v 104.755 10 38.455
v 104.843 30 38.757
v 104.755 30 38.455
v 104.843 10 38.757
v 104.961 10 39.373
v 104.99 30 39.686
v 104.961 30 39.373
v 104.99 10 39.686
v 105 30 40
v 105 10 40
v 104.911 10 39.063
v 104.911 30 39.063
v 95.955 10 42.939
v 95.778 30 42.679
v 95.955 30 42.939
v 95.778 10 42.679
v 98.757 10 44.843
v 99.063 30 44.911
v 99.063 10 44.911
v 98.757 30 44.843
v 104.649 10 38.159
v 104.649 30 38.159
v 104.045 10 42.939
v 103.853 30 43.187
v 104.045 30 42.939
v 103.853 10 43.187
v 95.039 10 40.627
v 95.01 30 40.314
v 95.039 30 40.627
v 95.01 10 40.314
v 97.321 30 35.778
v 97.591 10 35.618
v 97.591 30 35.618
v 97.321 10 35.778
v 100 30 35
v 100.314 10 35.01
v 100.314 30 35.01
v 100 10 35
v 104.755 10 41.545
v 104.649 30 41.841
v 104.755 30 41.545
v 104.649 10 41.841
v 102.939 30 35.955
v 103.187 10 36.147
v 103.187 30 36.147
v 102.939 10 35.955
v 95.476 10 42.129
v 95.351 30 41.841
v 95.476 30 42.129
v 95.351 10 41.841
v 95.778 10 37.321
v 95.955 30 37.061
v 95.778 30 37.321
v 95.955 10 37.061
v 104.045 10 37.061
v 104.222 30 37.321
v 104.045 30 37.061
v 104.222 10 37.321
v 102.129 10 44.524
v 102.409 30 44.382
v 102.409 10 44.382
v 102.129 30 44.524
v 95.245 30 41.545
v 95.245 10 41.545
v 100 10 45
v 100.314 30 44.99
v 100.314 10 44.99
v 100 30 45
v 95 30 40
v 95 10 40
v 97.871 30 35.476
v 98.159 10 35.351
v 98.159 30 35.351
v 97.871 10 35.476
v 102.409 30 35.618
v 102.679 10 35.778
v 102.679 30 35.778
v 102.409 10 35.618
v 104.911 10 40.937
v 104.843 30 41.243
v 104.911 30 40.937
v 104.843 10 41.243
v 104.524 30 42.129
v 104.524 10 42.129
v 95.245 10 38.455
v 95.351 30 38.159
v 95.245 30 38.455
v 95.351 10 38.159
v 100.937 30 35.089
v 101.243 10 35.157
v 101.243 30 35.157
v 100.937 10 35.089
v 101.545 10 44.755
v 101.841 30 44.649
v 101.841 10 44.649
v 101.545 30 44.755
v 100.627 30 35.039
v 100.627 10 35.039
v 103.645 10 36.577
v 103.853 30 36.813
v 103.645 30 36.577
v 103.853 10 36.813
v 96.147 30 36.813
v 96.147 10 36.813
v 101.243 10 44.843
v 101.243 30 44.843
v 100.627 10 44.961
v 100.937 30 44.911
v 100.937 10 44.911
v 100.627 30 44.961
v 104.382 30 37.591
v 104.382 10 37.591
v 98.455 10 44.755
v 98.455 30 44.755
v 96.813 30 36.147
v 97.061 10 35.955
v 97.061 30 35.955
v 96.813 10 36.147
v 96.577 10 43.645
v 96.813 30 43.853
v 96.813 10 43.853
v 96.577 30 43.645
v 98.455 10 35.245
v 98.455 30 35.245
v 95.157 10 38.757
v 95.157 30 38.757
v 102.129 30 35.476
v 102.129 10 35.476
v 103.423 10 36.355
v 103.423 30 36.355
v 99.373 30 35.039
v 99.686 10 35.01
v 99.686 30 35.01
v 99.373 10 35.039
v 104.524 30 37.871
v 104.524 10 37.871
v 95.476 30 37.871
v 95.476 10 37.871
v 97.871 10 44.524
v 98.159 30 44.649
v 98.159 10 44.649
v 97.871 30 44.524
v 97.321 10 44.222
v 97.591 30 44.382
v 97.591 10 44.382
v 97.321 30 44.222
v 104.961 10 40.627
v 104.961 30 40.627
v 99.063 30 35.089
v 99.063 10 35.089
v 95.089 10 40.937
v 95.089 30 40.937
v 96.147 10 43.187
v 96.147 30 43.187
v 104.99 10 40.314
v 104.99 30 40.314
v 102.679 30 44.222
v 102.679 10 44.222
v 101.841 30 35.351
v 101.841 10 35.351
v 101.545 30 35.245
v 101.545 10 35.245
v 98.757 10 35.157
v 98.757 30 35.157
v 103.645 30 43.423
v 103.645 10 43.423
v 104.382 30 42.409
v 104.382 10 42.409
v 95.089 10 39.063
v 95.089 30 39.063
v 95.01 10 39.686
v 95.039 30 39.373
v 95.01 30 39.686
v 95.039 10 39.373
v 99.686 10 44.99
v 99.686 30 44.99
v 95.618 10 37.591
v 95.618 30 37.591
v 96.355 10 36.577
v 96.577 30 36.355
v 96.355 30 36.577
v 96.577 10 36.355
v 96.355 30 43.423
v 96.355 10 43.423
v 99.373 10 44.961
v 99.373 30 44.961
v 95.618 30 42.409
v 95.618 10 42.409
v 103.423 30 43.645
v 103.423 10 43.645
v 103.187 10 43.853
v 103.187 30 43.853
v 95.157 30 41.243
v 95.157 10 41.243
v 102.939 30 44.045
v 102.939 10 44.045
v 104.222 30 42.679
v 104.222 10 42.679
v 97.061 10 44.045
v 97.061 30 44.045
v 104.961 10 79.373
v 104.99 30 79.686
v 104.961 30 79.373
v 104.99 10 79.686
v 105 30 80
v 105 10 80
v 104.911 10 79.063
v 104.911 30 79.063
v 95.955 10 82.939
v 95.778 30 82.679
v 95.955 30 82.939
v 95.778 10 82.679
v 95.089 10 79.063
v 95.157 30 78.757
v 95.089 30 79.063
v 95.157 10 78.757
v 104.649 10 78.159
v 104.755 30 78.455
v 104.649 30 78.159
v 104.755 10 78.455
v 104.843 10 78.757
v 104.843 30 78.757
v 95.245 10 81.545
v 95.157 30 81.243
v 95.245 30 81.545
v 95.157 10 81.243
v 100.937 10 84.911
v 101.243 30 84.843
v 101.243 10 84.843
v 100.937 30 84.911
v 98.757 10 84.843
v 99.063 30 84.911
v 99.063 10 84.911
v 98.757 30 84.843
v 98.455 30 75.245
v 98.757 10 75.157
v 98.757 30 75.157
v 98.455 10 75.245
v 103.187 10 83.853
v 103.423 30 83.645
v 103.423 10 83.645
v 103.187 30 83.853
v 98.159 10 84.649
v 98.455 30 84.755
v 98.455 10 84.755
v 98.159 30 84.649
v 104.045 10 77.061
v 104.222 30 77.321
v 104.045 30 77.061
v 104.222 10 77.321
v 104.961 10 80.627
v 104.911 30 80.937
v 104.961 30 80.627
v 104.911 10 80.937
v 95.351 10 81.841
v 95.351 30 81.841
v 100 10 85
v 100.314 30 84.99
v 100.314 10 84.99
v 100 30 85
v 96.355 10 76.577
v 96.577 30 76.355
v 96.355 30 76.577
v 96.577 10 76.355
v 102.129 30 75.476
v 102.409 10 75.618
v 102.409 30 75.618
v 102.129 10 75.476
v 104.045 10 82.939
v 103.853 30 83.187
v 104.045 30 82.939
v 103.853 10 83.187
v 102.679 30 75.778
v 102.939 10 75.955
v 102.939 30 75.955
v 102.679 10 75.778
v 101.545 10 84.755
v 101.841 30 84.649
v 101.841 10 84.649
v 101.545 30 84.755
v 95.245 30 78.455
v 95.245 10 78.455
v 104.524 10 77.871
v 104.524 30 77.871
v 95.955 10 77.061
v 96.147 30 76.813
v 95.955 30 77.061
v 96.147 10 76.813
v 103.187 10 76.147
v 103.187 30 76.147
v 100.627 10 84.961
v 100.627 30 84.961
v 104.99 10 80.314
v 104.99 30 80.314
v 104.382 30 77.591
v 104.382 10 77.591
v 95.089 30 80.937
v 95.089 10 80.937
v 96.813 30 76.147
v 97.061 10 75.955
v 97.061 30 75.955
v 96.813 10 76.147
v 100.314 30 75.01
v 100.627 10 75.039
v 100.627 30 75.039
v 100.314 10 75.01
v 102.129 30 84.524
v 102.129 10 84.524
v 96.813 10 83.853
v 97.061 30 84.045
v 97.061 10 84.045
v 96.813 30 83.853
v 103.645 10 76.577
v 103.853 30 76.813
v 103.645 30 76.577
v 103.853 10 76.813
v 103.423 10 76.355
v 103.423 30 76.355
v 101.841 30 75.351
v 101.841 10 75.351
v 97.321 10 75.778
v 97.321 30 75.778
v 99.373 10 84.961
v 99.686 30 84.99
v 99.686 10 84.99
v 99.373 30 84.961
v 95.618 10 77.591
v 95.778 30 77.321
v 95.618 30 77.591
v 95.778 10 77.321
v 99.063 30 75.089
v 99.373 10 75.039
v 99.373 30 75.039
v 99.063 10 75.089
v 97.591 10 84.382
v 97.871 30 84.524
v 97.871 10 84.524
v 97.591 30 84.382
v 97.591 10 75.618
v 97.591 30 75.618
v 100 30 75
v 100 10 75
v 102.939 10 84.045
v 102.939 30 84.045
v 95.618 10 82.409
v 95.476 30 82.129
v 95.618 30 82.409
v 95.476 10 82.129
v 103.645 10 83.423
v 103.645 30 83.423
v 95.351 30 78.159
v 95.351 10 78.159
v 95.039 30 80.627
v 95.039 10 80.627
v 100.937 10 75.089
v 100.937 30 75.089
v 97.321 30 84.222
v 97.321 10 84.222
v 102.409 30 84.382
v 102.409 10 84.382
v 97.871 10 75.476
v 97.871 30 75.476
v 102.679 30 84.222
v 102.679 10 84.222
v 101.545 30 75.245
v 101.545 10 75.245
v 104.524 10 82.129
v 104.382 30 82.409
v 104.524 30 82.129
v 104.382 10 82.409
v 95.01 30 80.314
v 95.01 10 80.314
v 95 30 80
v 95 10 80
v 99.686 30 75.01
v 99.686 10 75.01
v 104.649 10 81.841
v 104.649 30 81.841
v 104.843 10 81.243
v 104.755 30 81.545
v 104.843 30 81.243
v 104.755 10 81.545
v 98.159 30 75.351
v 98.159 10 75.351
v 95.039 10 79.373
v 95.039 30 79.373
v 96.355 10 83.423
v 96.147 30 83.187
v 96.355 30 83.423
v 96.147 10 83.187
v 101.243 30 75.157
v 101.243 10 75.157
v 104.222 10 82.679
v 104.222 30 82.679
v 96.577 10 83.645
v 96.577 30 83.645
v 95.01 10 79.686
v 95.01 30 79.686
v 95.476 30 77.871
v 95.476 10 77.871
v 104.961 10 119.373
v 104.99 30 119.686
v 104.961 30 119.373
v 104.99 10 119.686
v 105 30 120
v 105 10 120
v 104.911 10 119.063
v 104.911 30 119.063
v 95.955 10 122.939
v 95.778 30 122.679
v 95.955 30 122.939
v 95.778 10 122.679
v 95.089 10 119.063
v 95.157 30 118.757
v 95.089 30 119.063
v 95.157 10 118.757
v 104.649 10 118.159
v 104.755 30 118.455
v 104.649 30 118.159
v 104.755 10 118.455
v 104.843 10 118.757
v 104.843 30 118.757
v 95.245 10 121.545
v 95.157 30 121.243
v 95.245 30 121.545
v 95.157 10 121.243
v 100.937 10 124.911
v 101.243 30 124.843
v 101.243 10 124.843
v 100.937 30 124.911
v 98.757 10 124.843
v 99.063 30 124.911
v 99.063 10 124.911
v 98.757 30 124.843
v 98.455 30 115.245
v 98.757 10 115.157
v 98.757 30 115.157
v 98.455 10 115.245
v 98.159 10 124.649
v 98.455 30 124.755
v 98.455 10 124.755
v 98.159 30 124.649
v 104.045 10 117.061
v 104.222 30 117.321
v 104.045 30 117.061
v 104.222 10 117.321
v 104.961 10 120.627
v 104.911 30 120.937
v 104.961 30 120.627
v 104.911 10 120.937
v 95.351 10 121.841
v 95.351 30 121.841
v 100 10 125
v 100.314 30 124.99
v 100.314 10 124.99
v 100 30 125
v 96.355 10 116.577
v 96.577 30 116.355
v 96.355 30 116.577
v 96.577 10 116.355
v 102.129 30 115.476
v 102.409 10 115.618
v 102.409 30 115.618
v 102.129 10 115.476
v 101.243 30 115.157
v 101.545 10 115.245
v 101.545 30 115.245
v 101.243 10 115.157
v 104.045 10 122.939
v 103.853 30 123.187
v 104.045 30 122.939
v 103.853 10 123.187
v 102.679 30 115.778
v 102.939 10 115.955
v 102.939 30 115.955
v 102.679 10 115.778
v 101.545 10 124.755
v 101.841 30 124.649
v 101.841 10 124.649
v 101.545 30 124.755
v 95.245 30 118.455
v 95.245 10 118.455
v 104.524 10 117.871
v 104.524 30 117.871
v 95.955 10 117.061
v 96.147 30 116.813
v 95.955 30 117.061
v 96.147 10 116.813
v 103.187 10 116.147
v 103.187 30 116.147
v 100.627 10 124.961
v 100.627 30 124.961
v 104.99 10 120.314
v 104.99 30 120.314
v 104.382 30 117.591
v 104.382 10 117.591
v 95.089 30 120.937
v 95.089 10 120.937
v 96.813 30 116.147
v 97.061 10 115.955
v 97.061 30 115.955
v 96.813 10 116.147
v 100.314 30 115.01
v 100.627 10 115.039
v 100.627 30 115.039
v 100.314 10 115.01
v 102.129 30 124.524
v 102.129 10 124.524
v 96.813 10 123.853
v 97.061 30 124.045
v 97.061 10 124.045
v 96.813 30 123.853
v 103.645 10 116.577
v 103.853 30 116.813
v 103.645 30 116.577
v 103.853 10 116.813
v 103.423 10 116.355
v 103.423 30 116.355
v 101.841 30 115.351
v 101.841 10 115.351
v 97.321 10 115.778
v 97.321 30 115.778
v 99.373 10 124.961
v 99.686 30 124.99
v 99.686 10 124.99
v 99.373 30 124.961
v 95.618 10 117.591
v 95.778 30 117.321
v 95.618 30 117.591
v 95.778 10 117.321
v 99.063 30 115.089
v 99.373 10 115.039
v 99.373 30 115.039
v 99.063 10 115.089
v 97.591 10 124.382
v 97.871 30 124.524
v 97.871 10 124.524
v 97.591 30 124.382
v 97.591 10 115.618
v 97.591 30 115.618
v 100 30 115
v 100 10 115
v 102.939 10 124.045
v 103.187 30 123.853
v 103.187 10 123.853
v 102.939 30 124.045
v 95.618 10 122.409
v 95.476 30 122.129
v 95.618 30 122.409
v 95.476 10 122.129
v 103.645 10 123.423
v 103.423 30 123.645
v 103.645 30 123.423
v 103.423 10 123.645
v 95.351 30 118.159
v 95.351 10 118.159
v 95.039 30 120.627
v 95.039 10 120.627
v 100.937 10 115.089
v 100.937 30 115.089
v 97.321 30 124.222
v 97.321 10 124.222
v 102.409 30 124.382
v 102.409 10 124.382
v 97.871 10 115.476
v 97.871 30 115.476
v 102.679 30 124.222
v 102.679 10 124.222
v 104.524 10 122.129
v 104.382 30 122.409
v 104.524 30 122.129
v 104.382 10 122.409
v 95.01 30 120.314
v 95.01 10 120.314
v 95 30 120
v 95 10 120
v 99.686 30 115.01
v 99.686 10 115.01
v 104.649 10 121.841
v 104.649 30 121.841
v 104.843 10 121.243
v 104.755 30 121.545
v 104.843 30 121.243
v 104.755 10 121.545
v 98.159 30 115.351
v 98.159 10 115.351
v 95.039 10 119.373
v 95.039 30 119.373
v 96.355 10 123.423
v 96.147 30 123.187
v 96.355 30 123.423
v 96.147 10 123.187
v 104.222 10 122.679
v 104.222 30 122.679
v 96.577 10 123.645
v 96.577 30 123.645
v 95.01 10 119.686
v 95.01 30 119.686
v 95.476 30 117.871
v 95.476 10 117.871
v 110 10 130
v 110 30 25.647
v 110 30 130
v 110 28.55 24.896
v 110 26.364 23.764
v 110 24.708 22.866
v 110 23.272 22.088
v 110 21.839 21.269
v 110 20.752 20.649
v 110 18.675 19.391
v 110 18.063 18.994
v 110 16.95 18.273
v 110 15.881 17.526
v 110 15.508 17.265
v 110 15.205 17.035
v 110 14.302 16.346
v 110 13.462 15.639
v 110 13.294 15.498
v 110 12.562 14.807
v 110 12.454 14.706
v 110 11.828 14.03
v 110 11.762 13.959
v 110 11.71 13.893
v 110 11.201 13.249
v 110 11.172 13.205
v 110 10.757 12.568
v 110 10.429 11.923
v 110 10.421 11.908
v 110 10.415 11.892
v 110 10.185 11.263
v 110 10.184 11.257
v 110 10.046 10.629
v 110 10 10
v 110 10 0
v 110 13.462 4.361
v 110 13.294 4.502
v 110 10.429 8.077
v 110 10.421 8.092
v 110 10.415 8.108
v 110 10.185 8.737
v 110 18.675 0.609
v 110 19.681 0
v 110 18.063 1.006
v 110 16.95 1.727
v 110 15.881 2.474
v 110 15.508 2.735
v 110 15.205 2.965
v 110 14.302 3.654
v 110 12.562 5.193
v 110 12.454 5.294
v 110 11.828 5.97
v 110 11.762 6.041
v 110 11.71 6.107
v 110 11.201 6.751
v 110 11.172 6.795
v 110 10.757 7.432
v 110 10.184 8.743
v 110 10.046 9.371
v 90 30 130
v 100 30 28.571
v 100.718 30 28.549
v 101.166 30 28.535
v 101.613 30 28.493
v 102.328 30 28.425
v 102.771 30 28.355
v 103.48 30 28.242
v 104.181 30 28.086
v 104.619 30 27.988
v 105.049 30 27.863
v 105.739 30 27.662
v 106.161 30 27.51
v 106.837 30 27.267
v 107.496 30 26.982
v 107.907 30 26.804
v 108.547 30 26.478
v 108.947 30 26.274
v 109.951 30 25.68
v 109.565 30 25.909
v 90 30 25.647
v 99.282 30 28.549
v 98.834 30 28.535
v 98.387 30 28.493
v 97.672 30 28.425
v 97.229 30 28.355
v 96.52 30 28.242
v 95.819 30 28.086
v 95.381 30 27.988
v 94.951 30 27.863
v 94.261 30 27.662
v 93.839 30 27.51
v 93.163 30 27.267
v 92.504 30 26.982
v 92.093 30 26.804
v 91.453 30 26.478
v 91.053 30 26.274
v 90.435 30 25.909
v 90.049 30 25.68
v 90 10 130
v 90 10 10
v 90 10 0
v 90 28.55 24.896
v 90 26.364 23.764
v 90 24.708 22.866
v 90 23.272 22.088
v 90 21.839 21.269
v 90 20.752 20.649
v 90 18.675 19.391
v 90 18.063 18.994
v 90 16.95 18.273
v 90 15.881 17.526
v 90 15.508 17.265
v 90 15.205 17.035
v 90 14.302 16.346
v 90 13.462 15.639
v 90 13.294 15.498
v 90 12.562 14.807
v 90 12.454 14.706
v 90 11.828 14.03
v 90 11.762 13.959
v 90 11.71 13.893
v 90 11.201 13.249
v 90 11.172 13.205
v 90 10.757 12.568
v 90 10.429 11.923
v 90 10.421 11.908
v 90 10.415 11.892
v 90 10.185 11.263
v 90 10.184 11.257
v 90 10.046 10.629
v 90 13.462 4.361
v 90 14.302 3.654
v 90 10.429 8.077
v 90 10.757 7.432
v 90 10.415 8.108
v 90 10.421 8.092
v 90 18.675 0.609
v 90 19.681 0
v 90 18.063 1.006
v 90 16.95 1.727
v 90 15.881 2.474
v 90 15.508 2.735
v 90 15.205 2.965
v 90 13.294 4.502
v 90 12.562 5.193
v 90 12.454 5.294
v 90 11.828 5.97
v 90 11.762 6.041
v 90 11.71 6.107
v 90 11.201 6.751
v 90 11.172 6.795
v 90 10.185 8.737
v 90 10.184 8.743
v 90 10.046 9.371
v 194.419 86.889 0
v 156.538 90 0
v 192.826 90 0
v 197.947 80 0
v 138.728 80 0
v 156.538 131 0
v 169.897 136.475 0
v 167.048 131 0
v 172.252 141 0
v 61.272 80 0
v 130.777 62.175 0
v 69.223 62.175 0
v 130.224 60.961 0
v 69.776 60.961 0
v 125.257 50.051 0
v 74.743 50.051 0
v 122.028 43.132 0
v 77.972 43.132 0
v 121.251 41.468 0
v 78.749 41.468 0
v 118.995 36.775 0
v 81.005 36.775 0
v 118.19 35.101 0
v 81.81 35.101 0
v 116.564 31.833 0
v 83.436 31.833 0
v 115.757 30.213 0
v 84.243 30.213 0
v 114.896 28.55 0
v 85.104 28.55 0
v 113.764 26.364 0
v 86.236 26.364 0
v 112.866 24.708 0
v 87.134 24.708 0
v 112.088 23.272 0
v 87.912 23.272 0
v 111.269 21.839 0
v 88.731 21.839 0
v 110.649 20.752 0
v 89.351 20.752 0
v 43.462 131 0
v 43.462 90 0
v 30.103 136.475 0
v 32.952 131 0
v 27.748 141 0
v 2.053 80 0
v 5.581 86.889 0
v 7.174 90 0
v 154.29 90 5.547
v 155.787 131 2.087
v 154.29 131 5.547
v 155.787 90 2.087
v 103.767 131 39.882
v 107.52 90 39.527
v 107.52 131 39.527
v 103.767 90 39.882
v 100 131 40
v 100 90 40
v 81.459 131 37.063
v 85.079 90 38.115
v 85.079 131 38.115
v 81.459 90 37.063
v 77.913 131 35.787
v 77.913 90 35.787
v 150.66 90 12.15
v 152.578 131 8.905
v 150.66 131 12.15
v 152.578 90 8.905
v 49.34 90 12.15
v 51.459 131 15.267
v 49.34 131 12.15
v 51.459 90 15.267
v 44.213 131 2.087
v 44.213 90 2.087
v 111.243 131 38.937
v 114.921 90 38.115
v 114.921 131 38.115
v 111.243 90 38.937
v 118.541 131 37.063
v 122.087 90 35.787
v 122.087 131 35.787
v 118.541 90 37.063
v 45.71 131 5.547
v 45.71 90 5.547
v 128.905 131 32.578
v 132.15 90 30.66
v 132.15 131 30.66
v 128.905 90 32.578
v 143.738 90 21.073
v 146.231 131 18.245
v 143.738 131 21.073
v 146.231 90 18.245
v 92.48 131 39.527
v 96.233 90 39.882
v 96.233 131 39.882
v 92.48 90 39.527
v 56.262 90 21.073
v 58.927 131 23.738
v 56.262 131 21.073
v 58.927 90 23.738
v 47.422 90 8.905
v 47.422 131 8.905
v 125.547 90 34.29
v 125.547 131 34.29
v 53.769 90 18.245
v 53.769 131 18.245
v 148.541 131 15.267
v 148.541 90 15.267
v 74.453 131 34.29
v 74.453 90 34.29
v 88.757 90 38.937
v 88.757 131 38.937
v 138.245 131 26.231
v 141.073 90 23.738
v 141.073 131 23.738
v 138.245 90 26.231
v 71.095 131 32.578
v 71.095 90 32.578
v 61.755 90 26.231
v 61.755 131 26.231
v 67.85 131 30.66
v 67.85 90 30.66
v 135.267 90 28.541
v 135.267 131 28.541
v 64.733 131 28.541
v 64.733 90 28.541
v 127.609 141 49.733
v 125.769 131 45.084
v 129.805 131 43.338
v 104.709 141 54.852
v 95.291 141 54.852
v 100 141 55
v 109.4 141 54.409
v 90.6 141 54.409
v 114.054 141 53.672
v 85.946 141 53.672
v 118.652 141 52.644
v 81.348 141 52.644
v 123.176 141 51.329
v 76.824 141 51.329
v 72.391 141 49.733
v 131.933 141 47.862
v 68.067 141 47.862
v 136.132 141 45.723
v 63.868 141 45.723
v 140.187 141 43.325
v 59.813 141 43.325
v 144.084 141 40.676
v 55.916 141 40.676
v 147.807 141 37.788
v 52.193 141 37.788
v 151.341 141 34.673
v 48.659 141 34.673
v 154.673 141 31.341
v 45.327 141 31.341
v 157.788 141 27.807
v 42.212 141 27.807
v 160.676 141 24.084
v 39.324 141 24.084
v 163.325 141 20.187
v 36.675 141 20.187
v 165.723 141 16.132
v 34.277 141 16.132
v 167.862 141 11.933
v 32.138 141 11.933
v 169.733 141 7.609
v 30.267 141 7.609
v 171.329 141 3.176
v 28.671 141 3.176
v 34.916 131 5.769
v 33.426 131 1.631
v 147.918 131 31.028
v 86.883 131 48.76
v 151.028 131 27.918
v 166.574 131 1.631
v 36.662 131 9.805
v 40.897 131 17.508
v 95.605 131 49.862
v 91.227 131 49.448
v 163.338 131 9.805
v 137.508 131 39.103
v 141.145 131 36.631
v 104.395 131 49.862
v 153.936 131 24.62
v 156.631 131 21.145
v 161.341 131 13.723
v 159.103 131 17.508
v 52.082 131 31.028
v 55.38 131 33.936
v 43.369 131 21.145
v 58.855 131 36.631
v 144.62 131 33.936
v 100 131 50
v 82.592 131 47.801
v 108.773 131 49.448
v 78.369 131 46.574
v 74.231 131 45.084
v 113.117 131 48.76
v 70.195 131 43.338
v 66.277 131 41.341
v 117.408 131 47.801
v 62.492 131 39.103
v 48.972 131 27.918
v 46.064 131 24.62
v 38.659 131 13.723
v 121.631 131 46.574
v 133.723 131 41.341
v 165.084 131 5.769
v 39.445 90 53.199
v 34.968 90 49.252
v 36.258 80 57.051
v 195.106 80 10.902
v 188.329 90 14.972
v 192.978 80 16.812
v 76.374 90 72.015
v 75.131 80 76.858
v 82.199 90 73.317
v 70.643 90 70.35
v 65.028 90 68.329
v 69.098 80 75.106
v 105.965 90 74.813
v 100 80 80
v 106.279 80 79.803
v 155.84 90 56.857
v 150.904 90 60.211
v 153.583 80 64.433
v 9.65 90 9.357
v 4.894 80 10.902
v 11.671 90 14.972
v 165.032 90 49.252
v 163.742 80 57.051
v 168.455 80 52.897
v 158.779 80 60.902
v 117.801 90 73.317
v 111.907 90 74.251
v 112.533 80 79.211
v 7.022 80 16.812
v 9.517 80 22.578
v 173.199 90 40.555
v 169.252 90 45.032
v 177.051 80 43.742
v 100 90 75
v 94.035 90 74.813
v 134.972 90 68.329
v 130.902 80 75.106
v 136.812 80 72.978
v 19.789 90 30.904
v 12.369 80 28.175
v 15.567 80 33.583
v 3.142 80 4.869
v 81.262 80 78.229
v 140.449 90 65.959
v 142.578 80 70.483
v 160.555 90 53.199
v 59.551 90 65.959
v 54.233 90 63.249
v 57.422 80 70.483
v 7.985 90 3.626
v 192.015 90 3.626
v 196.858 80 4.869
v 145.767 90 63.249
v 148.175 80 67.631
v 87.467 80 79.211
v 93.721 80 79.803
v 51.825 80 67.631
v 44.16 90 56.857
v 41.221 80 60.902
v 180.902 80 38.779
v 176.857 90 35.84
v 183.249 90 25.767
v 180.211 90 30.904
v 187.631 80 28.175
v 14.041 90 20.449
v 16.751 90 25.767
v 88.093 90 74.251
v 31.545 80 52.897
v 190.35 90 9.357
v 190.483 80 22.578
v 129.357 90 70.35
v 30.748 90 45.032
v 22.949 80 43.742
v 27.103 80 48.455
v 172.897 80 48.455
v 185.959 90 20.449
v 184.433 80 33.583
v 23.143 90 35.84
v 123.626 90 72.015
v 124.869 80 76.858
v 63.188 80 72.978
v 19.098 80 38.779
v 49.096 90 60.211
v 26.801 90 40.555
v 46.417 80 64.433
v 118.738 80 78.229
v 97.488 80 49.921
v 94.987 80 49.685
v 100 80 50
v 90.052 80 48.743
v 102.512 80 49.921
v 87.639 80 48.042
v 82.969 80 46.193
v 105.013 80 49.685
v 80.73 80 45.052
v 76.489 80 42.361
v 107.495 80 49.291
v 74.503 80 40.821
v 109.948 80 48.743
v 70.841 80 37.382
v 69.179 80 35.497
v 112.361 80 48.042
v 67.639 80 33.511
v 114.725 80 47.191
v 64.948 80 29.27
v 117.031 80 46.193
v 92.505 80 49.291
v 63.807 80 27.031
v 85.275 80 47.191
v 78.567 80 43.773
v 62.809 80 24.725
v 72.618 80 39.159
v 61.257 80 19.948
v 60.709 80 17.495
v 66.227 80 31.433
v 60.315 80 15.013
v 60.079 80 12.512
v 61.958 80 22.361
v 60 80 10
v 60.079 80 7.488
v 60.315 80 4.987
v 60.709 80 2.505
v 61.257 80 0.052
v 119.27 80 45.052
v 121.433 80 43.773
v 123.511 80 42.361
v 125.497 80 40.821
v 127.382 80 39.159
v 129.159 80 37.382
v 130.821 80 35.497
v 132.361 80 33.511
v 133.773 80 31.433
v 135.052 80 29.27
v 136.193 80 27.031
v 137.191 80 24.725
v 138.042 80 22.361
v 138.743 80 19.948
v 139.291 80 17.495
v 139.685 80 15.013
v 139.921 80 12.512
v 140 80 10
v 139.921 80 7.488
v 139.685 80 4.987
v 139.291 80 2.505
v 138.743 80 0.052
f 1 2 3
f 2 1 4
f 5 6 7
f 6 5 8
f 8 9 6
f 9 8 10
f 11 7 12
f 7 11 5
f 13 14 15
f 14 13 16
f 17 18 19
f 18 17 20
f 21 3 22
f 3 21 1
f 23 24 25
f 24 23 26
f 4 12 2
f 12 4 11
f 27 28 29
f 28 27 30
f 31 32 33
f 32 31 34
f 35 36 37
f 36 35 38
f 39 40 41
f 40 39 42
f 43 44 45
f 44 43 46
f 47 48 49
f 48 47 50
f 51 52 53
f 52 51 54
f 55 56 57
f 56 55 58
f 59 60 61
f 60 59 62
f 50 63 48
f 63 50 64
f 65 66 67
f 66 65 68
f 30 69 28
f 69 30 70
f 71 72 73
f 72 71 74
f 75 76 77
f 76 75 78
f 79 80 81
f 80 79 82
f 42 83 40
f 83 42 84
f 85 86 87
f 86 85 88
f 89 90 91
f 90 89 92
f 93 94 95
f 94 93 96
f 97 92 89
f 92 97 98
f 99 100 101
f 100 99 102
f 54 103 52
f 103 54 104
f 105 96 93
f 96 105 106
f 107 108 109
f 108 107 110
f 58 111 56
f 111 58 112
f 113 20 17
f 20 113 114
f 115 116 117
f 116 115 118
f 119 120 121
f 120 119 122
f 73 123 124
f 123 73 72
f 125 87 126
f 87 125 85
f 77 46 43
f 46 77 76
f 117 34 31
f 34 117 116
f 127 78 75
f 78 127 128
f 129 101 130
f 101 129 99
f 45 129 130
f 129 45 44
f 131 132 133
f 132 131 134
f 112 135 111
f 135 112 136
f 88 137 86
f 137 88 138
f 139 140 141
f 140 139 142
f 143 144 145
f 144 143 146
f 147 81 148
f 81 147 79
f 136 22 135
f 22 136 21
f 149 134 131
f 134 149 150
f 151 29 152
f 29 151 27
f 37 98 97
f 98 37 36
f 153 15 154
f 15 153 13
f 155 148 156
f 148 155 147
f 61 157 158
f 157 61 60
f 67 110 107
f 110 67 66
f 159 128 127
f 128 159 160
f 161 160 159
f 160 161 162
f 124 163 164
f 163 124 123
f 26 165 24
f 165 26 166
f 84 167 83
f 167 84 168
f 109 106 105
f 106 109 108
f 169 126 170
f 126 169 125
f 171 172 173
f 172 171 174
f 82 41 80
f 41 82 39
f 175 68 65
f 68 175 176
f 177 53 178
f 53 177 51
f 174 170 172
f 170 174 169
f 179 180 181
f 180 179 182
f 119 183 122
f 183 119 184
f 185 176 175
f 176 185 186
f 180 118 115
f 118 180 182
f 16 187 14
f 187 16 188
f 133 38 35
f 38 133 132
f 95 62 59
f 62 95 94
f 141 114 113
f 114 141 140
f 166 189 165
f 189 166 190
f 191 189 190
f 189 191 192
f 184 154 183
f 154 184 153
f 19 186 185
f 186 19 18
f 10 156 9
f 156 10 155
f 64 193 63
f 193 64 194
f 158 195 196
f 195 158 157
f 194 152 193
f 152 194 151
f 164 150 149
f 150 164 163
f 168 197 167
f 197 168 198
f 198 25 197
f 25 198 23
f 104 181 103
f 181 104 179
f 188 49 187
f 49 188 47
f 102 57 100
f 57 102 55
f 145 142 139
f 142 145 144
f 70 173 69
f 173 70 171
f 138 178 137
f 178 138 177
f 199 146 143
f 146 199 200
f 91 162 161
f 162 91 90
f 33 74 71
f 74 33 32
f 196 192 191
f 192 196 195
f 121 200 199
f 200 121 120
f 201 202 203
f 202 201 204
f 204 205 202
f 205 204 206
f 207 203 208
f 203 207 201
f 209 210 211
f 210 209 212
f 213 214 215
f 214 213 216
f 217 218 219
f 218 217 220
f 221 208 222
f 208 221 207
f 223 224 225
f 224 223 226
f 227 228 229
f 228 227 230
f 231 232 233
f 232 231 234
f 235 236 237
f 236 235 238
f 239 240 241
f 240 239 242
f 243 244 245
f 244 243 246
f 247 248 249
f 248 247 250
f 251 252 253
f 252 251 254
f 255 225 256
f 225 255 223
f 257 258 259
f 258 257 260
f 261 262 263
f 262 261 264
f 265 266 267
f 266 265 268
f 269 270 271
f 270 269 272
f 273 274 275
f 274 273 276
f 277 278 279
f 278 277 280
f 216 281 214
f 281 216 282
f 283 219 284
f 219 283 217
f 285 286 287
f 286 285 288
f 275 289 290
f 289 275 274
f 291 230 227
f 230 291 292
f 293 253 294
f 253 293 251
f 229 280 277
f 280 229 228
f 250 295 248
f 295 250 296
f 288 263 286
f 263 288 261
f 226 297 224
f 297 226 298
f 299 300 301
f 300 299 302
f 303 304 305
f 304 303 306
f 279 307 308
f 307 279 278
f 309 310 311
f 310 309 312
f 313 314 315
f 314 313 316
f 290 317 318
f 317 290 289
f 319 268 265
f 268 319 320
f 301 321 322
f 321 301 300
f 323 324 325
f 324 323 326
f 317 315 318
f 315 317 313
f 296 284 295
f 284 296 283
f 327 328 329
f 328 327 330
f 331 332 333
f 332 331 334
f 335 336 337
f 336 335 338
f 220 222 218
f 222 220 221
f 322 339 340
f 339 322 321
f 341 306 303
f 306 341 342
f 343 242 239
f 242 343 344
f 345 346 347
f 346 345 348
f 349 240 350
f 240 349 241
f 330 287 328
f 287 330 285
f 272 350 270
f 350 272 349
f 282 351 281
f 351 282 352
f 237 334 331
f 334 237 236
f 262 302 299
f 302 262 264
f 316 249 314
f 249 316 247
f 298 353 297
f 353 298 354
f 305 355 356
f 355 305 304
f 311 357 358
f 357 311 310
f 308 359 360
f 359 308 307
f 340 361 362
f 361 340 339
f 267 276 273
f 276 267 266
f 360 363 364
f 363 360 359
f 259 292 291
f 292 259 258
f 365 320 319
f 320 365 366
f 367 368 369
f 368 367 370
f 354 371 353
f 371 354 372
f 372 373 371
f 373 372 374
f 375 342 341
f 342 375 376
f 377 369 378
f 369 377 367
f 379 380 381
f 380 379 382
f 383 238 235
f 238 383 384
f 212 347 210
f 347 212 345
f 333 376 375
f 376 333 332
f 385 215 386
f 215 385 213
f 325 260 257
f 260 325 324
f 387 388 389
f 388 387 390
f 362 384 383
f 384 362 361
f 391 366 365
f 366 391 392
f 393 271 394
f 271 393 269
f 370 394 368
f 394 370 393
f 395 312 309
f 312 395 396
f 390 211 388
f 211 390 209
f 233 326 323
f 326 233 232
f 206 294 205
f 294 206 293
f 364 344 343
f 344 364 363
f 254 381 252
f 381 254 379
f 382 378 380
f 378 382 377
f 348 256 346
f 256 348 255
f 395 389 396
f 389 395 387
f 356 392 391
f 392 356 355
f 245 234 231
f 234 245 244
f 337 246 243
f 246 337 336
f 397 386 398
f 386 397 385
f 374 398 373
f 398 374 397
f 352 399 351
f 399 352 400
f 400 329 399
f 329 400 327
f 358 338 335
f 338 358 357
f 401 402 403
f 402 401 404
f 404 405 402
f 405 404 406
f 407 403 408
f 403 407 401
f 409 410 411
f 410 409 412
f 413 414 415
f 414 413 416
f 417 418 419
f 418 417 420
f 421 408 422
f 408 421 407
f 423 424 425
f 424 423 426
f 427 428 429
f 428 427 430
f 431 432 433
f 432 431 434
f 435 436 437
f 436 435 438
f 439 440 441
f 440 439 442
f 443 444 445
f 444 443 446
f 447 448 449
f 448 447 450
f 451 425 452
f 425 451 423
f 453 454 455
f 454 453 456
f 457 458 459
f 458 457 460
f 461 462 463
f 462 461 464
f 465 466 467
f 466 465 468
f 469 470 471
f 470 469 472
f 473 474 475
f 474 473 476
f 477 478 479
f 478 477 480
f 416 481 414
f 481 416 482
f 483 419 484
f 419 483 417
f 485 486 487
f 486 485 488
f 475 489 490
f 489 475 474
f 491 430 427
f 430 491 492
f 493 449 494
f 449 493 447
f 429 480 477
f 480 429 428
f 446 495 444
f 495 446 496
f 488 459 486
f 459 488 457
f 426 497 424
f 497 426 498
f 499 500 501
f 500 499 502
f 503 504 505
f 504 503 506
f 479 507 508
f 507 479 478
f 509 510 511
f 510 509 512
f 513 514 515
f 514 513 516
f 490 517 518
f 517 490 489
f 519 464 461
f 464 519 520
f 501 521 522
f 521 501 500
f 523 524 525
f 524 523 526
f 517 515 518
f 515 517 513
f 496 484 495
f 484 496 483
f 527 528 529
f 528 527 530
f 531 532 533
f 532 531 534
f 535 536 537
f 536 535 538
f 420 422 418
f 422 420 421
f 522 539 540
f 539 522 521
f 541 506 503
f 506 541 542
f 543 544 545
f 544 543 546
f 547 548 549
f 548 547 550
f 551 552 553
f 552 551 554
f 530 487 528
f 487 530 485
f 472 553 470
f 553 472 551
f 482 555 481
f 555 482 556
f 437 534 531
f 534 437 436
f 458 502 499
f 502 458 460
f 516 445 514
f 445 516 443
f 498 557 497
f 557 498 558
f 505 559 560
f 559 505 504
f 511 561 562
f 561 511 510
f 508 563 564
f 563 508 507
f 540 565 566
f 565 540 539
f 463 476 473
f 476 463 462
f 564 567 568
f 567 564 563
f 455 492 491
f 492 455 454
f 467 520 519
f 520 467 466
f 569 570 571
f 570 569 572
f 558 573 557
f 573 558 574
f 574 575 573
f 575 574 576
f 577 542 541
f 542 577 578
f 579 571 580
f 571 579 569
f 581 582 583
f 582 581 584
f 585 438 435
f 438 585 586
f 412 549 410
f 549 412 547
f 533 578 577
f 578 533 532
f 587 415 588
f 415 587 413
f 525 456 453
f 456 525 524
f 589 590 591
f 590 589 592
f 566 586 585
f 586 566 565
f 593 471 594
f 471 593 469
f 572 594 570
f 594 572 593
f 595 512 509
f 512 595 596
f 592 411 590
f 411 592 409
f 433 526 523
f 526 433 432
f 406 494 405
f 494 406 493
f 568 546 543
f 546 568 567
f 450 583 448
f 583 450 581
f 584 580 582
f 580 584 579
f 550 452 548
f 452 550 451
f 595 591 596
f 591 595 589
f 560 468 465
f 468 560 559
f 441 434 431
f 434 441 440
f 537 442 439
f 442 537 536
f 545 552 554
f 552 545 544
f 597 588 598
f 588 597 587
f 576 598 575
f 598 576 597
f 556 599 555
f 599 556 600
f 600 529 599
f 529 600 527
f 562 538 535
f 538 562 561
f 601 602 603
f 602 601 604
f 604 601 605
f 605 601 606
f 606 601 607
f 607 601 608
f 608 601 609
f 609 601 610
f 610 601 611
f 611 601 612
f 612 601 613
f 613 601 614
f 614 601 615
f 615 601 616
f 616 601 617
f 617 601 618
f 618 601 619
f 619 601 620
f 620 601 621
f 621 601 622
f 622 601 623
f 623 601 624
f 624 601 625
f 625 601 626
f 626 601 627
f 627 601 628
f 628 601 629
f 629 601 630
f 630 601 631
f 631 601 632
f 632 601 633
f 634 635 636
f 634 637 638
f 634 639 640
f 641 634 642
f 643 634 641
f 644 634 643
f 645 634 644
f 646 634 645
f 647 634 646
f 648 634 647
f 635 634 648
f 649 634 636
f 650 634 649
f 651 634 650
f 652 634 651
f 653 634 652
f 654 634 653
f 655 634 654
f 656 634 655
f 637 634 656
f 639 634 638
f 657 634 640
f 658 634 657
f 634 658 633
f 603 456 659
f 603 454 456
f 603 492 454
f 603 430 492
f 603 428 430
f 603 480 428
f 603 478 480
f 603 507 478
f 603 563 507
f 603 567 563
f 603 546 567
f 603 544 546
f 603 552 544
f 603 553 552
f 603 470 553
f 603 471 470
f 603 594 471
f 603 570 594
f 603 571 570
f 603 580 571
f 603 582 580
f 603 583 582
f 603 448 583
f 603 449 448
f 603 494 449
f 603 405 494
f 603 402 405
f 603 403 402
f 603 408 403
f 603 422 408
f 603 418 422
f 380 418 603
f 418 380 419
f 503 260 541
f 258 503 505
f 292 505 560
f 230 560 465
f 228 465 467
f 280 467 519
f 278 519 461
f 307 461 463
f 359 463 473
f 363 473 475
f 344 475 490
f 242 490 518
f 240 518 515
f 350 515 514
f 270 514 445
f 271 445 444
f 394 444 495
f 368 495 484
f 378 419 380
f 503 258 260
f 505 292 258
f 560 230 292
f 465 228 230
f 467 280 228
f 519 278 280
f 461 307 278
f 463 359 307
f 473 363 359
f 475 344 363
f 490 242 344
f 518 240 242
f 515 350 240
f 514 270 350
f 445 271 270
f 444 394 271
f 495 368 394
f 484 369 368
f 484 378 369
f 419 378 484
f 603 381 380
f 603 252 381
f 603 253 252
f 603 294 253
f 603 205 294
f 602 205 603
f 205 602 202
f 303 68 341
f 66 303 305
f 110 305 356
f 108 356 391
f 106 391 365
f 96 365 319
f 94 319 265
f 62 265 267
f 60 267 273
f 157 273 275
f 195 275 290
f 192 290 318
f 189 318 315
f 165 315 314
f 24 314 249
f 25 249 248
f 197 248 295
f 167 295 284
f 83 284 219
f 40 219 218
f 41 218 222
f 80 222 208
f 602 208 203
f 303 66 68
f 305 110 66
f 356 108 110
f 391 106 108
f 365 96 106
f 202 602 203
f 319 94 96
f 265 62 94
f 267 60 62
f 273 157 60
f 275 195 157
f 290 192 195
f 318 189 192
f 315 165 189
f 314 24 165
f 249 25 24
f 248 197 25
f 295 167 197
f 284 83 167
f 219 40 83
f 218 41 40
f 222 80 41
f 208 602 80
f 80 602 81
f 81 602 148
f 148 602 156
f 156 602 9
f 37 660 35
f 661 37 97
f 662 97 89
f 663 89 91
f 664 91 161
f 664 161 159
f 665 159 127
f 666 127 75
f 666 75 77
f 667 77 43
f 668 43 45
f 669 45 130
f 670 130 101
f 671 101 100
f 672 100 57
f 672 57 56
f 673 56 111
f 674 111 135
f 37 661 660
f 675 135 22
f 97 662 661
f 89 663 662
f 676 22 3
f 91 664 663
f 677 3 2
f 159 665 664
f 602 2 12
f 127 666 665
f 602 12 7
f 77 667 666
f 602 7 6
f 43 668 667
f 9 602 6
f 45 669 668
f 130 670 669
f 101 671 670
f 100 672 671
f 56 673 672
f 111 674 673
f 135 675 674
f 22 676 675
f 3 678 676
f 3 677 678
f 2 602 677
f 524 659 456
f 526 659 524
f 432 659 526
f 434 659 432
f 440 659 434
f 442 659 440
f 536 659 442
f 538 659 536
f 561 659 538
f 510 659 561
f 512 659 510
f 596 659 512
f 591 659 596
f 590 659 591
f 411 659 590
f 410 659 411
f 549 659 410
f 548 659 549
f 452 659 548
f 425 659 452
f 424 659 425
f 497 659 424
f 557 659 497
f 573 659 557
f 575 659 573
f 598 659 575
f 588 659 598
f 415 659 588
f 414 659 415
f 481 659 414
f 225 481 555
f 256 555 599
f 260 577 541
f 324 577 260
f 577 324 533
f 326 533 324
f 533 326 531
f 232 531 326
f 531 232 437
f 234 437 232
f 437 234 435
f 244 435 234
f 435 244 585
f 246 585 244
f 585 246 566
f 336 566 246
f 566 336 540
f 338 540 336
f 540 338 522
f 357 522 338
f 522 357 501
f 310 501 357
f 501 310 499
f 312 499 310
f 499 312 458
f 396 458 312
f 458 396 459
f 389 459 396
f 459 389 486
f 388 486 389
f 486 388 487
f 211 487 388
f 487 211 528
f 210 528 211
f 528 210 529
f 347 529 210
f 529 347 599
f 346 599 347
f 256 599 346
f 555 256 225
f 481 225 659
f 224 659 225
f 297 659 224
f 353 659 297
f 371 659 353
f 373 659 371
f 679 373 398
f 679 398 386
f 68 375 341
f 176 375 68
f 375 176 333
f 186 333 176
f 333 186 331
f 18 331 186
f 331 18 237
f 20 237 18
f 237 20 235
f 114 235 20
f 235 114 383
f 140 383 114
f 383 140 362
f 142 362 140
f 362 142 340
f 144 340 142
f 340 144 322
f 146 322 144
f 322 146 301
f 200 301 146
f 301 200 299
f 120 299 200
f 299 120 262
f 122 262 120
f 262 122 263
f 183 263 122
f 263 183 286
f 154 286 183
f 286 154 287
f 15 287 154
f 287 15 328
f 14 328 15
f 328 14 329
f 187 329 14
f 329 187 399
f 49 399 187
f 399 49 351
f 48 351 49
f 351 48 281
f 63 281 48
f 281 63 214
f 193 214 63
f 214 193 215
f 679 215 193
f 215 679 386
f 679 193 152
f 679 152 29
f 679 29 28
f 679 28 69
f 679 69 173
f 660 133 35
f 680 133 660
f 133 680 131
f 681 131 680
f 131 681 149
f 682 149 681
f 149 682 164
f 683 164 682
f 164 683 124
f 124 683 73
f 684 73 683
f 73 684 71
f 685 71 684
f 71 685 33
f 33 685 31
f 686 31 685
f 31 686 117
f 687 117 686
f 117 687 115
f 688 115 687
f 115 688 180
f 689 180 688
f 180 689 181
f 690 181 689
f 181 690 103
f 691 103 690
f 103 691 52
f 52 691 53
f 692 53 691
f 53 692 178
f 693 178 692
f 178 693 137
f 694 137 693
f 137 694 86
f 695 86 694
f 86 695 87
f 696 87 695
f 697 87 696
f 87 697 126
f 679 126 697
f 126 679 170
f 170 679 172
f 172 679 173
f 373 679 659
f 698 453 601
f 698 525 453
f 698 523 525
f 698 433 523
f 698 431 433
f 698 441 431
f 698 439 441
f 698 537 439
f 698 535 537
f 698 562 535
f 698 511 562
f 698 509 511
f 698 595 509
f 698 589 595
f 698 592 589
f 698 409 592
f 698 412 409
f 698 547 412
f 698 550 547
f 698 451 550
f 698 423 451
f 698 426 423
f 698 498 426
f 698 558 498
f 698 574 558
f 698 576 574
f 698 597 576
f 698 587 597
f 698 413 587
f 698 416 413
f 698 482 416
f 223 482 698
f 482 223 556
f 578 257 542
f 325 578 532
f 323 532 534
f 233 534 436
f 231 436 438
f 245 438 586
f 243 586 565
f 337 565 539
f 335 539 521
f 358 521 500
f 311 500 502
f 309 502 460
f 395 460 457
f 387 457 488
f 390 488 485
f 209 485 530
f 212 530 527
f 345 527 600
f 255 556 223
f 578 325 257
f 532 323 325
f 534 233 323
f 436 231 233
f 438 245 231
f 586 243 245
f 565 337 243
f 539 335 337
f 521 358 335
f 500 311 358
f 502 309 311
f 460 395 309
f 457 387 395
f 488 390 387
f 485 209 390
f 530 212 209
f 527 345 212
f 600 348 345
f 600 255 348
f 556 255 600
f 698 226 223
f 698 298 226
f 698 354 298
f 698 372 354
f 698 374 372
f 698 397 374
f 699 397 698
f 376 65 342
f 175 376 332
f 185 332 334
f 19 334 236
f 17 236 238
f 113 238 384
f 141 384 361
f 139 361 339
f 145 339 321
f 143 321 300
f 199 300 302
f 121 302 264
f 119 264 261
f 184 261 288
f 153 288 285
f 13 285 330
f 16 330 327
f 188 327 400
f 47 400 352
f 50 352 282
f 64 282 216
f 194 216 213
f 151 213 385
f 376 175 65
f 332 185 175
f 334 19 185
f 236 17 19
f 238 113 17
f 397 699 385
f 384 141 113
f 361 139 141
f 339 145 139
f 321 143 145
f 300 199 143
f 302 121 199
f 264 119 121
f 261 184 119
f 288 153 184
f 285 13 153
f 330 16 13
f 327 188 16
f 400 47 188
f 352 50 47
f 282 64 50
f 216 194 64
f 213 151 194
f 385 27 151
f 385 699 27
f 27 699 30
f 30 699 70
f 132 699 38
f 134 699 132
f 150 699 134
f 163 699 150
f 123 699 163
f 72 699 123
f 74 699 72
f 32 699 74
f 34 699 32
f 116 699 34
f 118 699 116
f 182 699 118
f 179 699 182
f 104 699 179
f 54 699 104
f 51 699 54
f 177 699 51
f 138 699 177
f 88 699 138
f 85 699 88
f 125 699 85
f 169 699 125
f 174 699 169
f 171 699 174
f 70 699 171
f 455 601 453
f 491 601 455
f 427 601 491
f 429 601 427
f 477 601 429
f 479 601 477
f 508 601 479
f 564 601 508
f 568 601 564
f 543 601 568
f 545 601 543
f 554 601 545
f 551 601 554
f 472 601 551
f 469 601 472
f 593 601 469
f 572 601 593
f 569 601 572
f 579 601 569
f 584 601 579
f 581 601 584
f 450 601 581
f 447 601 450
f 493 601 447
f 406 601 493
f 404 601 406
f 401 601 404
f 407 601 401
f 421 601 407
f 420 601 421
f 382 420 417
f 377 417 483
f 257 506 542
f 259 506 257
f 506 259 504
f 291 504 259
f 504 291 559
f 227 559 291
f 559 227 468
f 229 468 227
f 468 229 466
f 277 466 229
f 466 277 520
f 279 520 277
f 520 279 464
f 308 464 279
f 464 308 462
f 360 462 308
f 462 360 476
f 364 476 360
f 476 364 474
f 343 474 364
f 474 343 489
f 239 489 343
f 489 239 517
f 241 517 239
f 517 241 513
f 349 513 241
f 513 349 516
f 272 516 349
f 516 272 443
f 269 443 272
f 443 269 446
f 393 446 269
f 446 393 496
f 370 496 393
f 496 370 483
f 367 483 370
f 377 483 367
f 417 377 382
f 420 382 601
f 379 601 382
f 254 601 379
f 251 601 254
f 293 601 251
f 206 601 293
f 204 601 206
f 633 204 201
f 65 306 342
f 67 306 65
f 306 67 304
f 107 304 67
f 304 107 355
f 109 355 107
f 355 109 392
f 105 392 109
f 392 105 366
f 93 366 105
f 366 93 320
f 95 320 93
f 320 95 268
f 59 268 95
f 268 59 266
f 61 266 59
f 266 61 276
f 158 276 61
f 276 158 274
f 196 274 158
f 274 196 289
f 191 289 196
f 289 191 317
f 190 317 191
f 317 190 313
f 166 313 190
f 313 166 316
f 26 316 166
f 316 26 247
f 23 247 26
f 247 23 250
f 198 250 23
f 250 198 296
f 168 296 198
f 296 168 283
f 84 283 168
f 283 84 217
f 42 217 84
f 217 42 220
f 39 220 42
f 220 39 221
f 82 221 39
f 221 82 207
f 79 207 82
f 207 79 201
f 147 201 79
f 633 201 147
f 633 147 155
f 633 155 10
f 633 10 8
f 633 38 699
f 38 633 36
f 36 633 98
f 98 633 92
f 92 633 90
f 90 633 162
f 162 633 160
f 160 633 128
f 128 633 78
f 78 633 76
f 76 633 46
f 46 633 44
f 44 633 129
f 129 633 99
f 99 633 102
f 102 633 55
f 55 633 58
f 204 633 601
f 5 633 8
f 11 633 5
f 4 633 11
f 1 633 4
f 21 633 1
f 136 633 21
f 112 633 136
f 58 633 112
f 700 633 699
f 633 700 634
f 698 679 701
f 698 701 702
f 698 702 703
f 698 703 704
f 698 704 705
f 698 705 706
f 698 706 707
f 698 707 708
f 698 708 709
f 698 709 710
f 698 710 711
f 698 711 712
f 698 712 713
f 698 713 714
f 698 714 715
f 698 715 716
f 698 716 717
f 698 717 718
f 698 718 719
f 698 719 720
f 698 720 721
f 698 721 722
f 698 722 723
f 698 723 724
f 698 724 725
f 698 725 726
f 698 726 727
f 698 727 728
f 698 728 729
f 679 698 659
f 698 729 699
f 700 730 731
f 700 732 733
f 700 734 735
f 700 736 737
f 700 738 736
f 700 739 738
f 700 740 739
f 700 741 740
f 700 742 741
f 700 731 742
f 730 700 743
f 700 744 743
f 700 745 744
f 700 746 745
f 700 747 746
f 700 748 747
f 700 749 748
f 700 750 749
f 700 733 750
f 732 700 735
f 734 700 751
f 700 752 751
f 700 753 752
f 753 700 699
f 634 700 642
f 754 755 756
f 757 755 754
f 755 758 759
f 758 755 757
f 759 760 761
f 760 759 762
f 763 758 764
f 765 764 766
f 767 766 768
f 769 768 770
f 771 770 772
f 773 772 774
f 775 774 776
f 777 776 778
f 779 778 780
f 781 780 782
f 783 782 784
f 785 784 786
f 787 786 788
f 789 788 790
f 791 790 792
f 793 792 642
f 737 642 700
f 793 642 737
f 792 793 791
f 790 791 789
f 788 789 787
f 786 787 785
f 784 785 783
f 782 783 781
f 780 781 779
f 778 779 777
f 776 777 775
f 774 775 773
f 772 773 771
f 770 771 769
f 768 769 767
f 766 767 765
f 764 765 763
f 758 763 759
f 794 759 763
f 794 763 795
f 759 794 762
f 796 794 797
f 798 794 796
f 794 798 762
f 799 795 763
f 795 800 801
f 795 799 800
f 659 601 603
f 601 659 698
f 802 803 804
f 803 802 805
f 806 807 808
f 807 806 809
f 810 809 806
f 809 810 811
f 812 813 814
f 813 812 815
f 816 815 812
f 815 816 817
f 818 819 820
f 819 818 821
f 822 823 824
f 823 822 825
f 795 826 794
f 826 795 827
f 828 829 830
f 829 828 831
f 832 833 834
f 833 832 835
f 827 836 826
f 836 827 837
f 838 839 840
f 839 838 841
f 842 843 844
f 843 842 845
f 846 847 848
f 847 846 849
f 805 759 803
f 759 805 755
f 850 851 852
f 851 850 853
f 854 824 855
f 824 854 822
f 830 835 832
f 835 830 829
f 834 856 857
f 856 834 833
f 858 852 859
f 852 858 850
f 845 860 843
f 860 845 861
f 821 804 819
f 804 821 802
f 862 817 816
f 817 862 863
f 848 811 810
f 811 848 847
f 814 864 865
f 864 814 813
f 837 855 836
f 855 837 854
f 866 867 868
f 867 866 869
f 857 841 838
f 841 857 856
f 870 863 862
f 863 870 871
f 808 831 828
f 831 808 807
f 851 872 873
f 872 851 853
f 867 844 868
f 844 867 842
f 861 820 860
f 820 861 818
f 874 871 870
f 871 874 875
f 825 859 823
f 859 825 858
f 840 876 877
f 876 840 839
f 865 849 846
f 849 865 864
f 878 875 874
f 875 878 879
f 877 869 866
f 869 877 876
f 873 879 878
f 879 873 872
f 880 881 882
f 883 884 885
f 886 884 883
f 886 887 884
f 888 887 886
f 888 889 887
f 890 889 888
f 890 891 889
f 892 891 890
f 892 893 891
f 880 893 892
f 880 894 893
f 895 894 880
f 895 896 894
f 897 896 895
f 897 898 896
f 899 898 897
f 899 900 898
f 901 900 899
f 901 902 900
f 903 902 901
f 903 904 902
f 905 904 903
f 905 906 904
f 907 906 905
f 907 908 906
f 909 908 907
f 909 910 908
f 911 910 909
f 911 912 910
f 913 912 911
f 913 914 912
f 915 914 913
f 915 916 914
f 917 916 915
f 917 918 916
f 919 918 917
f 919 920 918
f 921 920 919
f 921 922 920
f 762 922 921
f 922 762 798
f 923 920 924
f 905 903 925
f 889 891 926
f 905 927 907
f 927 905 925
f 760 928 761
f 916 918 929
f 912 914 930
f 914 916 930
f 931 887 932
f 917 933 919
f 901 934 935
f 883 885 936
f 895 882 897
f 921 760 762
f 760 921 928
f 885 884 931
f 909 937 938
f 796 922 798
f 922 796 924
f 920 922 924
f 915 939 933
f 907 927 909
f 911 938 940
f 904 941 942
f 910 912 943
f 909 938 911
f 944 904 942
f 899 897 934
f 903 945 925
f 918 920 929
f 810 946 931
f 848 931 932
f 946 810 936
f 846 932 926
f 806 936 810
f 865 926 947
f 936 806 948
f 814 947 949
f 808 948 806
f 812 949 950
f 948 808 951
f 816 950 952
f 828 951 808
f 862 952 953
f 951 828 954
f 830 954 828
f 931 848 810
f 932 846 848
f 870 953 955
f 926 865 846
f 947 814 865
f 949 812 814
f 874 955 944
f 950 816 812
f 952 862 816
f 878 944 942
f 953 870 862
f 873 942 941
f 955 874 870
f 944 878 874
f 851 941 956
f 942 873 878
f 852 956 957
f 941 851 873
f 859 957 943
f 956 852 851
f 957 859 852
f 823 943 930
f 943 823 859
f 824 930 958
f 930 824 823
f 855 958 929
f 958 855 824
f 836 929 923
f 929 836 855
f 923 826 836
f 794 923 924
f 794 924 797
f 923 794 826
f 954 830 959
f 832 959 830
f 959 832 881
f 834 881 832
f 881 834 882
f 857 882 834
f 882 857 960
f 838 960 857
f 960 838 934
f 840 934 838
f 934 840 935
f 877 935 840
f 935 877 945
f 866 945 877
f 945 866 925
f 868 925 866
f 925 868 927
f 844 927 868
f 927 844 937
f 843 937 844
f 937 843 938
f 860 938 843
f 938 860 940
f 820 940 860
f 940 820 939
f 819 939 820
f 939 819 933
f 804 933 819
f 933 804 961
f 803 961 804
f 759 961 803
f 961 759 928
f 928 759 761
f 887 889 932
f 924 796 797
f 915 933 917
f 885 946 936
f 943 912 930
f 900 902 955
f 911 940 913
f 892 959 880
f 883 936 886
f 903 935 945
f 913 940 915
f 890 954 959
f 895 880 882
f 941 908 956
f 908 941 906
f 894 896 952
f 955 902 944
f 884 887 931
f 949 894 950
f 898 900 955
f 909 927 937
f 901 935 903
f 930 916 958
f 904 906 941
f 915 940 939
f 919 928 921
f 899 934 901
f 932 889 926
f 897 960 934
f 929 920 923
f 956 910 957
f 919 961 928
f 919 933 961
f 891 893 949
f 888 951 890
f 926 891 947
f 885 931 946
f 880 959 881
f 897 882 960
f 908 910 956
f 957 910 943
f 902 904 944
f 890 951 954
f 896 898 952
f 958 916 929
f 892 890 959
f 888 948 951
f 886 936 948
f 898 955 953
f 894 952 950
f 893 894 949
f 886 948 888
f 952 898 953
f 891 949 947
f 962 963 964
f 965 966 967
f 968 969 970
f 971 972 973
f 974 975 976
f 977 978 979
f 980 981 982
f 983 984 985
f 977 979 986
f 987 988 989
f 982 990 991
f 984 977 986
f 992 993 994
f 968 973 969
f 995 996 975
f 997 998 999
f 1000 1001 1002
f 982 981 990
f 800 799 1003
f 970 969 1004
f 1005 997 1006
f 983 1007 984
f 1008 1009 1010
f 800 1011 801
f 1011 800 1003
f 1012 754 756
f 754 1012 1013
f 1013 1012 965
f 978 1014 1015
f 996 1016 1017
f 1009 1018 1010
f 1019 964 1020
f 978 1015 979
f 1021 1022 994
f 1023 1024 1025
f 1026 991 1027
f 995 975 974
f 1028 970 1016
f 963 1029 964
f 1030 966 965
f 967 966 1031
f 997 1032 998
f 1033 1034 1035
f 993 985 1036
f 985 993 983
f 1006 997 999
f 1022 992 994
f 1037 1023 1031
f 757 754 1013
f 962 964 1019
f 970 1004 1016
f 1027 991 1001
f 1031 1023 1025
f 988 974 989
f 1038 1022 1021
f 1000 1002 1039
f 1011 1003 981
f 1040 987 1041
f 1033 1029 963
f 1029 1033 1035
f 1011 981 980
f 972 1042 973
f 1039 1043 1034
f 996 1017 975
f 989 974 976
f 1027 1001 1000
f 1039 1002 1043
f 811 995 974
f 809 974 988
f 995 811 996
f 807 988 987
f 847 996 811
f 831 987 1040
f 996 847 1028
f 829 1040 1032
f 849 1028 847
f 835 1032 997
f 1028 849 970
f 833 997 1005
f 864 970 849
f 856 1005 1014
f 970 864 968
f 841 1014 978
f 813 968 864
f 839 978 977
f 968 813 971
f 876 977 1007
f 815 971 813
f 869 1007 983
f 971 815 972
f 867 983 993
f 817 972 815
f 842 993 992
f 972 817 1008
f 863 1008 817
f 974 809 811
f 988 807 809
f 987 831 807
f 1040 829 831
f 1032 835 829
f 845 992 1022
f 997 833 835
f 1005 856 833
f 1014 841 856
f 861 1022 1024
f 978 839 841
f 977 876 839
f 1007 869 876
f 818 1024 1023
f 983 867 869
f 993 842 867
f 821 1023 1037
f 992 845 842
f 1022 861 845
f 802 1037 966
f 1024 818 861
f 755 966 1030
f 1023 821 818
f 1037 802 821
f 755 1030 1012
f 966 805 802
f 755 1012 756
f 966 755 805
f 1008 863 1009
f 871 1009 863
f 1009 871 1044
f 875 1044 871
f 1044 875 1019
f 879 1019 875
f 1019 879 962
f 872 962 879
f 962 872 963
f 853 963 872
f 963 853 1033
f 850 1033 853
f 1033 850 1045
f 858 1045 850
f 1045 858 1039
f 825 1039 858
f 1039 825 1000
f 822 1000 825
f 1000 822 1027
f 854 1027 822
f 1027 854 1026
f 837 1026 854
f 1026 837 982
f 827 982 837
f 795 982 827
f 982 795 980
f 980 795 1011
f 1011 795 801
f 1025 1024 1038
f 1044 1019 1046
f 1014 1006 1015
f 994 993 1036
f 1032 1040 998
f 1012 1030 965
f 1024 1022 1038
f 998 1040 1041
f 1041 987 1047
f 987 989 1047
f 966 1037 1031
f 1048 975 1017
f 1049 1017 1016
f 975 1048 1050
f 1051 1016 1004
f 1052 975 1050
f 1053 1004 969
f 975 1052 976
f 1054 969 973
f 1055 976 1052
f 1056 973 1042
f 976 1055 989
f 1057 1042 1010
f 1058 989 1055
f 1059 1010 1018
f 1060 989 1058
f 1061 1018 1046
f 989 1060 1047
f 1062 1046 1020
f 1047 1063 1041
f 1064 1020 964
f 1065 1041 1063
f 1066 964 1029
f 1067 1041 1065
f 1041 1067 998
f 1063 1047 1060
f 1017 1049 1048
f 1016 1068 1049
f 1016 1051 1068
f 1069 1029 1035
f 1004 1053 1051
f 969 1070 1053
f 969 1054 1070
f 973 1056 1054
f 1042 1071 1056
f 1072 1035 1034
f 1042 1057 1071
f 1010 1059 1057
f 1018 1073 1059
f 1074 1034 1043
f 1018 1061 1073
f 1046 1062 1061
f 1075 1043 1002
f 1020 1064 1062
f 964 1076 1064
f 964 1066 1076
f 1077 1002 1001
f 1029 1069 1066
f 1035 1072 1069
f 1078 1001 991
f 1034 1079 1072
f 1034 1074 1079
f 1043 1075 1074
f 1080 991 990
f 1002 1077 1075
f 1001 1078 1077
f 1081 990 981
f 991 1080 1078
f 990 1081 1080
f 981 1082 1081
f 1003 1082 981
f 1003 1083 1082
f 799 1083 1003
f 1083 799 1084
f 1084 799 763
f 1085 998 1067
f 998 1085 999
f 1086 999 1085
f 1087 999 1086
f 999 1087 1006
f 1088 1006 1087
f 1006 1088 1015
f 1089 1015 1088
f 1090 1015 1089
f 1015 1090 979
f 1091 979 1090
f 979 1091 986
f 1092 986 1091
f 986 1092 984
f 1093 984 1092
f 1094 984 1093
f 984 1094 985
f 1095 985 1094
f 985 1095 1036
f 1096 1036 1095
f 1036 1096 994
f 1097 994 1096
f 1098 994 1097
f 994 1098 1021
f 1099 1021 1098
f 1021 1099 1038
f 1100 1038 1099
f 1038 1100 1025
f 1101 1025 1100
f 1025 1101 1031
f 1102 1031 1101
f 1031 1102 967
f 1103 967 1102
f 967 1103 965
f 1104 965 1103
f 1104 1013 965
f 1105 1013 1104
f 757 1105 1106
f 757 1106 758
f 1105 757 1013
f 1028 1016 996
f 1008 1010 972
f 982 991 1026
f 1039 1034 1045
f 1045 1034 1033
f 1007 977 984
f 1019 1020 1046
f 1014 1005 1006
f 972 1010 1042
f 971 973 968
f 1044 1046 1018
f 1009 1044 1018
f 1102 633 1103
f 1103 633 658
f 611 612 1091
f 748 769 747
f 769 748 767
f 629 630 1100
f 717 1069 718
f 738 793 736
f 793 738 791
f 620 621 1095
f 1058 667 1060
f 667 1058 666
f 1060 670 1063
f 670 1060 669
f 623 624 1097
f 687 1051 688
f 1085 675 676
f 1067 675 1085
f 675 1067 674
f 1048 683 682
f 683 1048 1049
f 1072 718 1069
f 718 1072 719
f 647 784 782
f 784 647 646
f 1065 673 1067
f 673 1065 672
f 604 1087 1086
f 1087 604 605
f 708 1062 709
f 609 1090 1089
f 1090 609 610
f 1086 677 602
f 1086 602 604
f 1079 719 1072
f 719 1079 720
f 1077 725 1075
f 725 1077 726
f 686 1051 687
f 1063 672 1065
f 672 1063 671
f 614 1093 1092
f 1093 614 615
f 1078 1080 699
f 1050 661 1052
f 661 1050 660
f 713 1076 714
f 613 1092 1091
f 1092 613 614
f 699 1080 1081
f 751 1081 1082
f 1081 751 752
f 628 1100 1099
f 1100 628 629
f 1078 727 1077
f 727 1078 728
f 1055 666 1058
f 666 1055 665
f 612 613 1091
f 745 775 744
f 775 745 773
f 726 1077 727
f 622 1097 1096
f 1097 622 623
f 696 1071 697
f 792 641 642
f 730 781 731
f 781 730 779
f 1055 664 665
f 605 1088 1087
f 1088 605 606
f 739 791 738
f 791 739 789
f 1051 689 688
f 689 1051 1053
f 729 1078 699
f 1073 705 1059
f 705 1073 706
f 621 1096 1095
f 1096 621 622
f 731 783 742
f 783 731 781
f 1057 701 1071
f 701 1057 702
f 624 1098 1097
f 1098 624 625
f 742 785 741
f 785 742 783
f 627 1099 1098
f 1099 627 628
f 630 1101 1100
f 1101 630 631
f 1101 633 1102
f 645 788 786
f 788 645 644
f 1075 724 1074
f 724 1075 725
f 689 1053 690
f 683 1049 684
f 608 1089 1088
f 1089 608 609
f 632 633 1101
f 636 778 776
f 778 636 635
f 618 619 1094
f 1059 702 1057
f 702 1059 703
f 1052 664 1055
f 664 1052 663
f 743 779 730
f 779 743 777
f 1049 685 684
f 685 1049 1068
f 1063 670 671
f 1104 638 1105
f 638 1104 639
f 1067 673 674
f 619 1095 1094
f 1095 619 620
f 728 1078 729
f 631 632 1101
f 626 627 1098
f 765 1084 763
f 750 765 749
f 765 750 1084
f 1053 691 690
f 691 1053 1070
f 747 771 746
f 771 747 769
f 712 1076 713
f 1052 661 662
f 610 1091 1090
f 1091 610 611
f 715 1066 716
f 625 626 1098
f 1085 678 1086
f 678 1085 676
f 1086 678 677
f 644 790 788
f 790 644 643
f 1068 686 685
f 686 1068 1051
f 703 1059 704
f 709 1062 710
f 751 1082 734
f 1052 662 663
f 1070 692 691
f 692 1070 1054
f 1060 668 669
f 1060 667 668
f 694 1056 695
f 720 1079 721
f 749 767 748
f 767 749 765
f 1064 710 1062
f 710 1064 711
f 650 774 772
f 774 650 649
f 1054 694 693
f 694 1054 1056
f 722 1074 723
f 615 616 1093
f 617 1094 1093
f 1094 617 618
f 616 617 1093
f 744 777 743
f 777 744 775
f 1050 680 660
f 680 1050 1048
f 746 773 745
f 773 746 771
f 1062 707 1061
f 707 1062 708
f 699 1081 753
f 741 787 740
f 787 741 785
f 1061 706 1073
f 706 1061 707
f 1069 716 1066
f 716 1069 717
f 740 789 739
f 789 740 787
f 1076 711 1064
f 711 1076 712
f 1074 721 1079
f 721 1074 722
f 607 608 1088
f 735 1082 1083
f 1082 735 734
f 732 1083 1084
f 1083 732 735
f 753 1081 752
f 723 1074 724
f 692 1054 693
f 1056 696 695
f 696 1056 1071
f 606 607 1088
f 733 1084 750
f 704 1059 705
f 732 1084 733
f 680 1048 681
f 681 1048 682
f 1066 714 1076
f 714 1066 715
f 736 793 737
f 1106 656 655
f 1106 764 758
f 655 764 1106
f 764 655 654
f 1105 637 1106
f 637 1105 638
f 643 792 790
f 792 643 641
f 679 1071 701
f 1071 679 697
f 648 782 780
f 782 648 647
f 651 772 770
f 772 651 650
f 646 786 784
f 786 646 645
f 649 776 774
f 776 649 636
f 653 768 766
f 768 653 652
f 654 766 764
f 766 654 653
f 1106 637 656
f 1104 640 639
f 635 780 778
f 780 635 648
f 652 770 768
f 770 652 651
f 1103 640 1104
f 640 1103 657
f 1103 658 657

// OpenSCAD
// Headphones rack
// Scale 1 = mm
// Altair 2017 CC BY-NC-SA

$fn = 100;

translate([100,10,0])
difference()
{
rotate([-90,0,0])
{
difference()
{

    translate([0,-65,10])
        cube([20,130, 20], center=true);
    
    translate([0,-40,0])
    union()
    {
        cylinder(50, r=5, center=true);
        
        translate([0,-40,0])
            cylinder(50, r=5, center = true);
        
        translate([0,-80,0])
            cylinder(50, r=5, center = true);
                
        
    }
    
}

//scale([1,2.2,1])
    translate([0,-10,35])
        cylinder(70,r2=40,r1=10,center=true);
difference()
{
    translate([0,20,65])
    union()
    {
        //difference()
        {
            color("indigo",1.0)
            cylinder(130, r=60, center=true);
            //translate([-90, -20,-70])
            //    cube([180,160,140]  , center=false);
        }
        
        translate([0,0,61])
        //difference()
        {
            
            cylinder(10, r1=70,r2=75, center=true);
            //translate([-150, -20,-70])
            //    cube([300,160,140]  , center=false);
        }
        
        translate([0,0,10])
        //difference()
        {
            cylinder(10, r2=95,r1=100, center=true);
            //translate([-150, -20,-70])
            //    cube([300,160,140]  , center=false);
        }
       
    }
    
    cube([200,200,140],center=true);
}
}

translate([-200,-200,-200])
    cube([400,400,200]);

}
